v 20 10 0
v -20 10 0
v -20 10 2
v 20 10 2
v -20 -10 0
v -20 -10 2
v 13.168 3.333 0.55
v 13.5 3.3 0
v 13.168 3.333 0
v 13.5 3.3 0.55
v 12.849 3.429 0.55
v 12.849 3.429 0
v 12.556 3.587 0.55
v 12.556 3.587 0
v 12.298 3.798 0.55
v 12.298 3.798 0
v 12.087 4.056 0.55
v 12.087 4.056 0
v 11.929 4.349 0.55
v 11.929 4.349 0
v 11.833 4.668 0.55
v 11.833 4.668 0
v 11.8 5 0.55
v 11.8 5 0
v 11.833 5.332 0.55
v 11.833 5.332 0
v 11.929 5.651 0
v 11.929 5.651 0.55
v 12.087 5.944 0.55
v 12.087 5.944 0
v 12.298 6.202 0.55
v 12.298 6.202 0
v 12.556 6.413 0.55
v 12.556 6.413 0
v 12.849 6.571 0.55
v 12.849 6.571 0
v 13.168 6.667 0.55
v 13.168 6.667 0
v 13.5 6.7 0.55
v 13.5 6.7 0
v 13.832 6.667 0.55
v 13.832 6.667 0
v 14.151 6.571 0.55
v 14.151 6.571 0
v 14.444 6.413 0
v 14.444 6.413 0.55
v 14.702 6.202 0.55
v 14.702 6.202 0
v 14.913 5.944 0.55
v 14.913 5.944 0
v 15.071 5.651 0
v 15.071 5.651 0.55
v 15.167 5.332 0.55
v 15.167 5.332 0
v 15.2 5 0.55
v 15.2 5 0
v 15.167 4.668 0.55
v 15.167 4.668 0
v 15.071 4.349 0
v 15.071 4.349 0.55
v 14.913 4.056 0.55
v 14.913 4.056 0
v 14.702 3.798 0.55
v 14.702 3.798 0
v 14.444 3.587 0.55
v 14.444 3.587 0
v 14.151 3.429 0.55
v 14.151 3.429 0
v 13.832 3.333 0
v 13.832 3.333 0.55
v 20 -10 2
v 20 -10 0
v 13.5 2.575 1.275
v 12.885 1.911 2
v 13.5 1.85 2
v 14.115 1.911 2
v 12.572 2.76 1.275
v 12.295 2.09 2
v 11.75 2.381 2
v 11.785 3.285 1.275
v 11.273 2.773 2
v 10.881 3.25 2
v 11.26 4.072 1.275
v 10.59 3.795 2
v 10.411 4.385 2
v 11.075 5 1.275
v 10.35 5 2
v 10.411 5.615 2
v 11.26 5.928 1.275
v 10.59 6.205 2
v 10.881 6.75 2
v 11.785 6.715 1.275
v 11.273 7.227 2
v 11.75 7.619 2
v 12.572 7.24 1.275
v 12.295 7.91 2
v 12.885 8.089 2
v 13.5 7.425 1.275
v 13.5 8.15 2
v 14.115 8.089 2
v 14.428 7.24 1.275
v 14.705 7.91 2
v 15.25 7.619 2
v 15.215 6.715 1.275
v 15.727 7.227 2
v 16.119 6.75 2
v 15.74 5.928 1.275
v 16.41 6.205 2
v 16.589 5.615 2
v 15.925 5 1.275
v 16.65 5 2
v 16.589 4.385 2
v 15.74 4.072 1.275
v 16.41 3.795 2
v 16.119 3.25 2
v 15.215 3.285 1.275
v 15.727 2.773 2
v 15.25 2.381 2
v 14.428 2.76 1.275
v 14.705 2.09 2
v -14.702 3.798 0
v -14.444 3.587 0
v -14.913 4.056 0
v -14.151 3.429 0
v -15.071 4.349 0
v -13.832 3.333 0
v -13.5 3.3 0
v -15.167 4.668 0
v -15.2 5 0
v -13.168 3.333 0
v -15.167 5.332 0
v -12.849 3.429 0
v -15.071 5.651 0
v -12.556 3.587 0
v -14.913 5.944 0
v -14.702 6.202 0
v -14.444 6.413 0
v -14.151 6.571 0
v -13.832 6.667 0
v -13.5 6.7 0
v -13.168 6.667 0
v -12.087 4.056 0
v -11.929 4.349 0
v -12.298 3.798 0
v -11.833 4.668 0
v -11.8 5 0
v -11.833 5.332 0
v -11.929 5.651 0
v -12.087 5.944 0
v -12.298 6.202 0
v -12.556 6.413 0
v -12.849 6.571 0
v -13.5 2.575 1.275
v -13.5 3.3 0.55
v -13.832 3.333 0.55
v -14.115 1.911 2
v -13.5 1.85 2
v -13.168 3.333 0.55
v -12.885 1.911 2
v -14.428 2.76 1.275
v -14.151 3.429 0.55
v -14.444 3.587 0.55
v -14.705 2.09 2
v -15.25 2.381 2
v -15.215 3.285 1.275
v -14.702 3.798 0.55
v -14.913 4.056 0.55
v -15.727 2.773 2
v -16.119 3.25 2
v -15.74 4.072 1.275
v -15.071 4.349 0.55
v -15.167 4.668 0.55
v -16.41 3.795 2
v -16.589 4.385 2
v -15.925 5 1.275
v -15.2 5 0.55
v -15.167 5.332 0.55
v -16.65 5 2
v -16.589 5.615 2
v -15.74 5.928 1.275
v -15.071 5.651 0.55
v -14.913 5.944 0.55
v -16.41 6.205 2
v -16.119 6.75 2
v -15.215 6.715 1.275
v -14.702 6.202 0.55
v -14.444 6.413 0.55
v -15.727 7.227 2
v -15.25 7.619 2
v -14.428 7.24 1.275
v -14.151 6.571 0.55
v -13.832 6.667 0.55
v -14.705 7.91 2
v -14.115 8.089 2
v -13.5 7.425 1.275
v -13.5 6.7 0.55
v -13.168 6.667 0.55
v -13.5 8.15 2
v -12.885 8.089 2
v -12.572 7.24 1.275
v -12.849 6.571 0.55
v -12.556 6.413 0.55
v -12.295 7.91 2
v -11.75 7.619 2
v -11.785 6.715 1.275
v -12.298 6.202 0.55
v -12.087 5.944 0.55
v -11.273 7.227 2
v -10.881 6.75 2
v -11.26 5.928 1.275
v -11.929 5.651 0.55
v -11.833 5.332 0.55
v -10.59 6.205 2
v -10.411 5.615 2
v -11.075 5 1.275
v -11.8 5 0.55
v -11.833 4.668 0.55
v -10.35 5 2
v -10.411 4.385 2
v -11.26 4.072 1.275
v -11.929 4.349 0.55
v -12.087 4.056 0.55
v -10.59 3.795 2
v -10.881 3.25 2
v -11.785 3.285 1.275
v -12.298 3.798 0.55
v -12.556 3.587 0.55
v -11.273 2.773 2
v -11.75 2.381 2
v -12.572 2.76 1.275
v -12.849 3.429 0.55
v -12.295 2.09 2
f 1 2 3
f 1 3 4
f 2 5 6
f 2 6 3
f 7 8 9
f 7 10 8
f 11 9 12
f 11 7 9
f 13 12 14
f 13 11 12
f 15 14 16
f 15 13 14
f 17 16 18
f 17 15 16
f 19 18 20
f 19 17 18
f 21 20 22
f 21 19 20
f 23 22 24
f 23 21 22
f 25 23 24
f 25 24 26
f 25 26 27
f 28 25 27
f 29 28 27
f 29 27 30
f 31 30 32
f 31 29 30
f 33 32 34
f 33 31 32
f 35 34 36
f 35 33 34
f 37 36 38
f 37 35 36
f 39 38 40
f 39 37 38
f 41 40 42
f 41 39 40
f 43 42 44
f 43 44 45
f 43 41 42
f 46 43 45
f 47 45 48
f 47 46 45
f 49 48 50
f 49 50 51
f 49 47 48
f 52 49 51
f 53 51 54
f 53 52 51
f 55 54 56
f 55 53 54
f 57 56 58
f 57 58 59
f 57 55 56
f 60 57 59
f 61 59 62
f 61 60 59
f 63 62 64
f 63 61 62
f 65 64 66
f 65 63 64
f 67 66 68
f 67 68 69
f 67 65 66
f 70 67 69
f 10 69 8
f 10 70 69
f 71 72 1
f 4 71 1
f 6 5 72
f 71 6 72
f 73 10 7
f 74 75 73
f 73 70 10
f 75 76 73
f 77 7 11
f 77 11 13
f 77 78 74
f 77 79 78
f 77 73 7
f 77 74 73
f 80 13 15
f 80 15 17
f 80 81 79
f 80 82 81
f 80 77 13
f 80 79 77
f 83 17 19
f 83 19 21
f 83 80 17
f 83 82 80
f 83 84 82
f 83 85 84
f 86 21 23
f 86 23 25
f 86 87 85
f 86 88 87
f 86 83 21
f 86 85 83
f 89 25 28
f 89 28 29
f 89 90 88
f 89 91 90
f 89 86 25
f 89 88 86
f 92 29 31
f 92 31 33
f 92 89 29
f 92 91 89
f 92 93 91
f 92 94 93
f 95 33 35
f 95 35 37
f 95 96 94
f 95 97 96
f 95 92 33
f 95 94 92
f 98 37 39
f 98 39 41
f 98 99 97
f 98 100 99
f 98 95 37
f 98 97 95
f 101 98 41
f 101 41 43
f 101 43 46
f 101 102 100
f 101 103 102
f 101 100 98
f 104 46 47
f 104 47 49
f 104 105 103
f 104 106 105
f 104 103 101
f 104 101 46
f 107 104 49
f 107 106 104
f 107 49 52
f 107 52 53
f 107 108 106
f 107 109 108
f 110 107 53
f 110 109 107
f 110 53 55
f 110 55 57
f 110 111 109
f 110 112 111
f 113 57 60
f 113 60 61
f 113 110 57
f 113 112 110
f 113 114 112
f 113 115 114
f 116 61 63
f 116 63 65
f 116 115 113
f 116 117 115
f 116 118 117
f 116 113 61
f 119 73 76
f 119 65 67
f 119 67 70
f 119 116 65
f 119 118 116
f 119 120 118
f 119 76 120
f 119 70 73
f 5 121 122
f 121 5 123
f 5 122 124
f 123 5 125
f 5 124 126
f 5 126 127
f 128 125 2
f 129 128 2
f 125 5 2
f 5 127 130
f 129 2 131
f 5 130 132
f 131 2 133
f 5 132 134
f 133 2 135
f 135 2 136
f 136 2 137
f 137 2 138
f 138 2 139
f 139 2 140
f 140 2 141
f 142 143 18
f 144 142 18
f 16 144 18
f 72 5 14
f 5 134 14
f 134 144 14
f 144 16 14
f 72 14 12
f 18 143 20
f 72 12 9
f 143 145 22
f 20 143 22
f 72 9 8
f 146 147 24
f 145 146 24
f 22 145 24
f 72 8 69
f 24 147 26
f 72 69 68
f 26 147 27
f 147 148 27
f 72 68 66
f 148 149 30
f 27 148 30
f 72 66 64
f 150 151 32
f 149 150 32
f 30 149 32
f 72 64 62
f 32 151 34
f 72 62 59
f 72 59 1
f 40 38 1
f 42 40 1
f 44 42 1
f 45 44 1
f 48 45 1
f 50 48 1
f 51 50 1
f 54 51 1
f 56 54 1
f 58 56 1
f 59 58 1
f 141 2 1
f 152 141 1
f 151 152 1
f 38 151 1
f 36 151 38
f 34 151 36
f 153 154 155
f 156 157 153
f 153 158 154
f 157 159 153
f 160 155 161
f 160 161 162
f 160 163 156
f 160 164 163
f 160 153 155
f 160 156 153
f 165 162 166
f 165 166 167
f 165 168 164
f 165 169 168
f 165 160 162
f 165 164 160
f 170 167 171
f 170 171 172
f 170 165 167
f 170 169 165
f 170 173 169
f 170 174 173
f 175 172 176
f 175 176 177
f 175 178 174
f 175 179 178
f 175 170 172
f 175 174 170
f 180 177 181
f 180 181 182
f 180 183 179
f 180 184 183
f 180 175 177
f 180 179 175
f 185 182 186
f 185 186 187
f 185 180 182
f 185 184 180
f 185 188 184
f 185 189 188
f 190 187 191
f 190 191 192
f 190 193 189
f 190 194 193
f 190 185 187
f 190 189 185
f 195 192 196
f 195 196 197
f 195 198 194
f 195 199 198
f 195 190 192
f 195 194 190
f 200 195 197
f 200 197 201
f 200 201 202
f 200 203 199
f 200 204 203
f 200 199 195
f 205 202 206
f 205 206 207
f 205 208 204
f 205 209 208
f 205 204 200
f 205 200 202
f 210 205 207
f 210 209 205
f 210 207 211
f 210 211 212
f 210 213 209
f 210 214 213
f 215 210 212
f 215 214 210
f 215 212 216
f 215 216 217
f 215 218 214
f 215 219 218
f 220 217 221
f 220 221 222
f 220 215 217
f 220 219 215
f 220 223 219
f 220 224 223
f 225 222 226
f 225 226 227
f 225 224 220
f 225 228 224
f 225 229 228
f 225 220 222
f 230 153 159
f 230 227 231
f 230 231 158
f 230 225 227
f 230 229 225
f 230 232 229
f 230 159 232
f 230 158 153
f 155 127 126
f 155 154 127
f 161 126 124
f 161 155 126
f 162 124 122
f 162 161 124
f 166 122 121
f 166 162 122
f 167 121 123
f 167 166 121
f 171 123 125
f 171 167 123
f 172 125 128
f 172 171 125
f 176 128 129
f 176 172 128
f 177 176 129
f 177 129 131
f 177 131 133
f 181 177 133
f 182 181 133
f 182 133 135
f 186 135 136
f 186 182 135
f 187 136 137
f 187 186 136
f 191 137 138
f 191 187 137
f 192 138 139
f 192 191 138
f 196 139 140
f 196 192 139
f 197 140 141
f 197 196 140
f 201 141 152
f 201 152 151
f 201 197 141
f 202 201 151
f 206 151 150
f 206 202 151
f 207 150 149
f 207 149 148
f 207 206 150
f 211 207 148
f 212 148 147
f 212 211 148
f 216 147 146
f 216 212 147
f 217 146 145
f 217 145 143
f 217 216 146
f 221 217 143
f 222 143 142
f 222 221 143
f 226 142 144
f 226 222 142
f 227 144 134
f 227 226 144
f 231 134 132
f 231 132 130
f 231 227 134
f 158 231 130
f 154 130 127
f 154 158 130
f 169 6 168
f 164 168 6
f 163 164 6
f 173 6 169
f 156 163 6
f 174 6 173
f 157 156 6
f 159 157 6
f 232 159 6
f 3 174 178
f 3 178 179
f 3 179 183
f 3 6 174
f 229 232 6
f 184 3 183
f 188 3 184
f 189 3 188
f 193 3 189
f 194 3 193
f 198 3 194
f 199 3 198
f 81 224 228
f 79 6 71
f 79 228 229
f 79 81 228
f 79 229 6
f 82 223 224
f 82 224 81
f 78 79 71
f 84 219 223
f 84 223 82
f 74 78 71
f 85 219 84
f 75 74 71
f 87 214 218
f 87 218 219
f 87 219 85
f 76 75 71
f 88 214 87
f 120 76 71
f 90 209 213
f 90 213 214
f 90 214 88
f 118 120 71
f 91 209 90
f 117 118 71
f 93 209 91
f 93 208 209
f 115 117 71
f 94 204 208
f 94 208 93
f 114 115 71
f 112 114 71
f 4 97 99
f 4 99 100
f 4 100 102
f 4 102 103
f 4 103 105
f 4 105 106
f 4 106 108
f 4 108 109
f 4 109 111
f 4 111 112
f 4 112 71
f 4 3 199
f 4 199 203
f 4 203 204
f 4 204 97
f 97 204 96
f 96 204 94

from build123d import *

# Parameters (mm, degrees)
SKETCH_1_W                  = 40
SKETCH_1_H                  = 20
EXTRUDE_1_DEPTH             = 2
HOLE_WIZARD_M3_1_AT_2_COUNT = 2
HOLE_WIZARD_M3_1_AT_2_PITCH = 27


with BuildPart() as part:
    # 草圖1 → 填料-伸長1 (new body)
    with BuildSketch(Plane.XY):
        Rectangle(SKETCH_1_W, SKETCH_1_H)
    extrude(amount=EXTRUDE_1_DEPTH)

    # 草圖2 → M3 平錐坑頭螺釘的錐孔1 (revolve, cut)
    with BuildSketch(Plane(origin=(-13.5, 5, 2), x_dir=(0, -1, 0), z_dir=(1, 0, 0))):
        Polygon((0, 0), (0, 2), (1.7, 2), (1.7, 1.45), (3.15, 0), align=None)
    hole_wizard_m3_1 = revolve(axis=Axis((-13.5, 5, 8.35), (0, 0, -1)), mode=Mode.SUBTRACT)

    # M3 平錐坑頭螺釘的錐孔1 at 2: M3 平錐坑頭螺釘的錐孔1 ×2
    with Locations(*[(i * HOLE_WIZARD_M3_1_AT_2_PITCH, 0, 0) for i in range(1, HOLE_WIZARD_M3_1_AT_2_COUNT)]):
        add(hole_wizard_m3_1, mode=Mode.SUBTRACT)


solid = part.part
